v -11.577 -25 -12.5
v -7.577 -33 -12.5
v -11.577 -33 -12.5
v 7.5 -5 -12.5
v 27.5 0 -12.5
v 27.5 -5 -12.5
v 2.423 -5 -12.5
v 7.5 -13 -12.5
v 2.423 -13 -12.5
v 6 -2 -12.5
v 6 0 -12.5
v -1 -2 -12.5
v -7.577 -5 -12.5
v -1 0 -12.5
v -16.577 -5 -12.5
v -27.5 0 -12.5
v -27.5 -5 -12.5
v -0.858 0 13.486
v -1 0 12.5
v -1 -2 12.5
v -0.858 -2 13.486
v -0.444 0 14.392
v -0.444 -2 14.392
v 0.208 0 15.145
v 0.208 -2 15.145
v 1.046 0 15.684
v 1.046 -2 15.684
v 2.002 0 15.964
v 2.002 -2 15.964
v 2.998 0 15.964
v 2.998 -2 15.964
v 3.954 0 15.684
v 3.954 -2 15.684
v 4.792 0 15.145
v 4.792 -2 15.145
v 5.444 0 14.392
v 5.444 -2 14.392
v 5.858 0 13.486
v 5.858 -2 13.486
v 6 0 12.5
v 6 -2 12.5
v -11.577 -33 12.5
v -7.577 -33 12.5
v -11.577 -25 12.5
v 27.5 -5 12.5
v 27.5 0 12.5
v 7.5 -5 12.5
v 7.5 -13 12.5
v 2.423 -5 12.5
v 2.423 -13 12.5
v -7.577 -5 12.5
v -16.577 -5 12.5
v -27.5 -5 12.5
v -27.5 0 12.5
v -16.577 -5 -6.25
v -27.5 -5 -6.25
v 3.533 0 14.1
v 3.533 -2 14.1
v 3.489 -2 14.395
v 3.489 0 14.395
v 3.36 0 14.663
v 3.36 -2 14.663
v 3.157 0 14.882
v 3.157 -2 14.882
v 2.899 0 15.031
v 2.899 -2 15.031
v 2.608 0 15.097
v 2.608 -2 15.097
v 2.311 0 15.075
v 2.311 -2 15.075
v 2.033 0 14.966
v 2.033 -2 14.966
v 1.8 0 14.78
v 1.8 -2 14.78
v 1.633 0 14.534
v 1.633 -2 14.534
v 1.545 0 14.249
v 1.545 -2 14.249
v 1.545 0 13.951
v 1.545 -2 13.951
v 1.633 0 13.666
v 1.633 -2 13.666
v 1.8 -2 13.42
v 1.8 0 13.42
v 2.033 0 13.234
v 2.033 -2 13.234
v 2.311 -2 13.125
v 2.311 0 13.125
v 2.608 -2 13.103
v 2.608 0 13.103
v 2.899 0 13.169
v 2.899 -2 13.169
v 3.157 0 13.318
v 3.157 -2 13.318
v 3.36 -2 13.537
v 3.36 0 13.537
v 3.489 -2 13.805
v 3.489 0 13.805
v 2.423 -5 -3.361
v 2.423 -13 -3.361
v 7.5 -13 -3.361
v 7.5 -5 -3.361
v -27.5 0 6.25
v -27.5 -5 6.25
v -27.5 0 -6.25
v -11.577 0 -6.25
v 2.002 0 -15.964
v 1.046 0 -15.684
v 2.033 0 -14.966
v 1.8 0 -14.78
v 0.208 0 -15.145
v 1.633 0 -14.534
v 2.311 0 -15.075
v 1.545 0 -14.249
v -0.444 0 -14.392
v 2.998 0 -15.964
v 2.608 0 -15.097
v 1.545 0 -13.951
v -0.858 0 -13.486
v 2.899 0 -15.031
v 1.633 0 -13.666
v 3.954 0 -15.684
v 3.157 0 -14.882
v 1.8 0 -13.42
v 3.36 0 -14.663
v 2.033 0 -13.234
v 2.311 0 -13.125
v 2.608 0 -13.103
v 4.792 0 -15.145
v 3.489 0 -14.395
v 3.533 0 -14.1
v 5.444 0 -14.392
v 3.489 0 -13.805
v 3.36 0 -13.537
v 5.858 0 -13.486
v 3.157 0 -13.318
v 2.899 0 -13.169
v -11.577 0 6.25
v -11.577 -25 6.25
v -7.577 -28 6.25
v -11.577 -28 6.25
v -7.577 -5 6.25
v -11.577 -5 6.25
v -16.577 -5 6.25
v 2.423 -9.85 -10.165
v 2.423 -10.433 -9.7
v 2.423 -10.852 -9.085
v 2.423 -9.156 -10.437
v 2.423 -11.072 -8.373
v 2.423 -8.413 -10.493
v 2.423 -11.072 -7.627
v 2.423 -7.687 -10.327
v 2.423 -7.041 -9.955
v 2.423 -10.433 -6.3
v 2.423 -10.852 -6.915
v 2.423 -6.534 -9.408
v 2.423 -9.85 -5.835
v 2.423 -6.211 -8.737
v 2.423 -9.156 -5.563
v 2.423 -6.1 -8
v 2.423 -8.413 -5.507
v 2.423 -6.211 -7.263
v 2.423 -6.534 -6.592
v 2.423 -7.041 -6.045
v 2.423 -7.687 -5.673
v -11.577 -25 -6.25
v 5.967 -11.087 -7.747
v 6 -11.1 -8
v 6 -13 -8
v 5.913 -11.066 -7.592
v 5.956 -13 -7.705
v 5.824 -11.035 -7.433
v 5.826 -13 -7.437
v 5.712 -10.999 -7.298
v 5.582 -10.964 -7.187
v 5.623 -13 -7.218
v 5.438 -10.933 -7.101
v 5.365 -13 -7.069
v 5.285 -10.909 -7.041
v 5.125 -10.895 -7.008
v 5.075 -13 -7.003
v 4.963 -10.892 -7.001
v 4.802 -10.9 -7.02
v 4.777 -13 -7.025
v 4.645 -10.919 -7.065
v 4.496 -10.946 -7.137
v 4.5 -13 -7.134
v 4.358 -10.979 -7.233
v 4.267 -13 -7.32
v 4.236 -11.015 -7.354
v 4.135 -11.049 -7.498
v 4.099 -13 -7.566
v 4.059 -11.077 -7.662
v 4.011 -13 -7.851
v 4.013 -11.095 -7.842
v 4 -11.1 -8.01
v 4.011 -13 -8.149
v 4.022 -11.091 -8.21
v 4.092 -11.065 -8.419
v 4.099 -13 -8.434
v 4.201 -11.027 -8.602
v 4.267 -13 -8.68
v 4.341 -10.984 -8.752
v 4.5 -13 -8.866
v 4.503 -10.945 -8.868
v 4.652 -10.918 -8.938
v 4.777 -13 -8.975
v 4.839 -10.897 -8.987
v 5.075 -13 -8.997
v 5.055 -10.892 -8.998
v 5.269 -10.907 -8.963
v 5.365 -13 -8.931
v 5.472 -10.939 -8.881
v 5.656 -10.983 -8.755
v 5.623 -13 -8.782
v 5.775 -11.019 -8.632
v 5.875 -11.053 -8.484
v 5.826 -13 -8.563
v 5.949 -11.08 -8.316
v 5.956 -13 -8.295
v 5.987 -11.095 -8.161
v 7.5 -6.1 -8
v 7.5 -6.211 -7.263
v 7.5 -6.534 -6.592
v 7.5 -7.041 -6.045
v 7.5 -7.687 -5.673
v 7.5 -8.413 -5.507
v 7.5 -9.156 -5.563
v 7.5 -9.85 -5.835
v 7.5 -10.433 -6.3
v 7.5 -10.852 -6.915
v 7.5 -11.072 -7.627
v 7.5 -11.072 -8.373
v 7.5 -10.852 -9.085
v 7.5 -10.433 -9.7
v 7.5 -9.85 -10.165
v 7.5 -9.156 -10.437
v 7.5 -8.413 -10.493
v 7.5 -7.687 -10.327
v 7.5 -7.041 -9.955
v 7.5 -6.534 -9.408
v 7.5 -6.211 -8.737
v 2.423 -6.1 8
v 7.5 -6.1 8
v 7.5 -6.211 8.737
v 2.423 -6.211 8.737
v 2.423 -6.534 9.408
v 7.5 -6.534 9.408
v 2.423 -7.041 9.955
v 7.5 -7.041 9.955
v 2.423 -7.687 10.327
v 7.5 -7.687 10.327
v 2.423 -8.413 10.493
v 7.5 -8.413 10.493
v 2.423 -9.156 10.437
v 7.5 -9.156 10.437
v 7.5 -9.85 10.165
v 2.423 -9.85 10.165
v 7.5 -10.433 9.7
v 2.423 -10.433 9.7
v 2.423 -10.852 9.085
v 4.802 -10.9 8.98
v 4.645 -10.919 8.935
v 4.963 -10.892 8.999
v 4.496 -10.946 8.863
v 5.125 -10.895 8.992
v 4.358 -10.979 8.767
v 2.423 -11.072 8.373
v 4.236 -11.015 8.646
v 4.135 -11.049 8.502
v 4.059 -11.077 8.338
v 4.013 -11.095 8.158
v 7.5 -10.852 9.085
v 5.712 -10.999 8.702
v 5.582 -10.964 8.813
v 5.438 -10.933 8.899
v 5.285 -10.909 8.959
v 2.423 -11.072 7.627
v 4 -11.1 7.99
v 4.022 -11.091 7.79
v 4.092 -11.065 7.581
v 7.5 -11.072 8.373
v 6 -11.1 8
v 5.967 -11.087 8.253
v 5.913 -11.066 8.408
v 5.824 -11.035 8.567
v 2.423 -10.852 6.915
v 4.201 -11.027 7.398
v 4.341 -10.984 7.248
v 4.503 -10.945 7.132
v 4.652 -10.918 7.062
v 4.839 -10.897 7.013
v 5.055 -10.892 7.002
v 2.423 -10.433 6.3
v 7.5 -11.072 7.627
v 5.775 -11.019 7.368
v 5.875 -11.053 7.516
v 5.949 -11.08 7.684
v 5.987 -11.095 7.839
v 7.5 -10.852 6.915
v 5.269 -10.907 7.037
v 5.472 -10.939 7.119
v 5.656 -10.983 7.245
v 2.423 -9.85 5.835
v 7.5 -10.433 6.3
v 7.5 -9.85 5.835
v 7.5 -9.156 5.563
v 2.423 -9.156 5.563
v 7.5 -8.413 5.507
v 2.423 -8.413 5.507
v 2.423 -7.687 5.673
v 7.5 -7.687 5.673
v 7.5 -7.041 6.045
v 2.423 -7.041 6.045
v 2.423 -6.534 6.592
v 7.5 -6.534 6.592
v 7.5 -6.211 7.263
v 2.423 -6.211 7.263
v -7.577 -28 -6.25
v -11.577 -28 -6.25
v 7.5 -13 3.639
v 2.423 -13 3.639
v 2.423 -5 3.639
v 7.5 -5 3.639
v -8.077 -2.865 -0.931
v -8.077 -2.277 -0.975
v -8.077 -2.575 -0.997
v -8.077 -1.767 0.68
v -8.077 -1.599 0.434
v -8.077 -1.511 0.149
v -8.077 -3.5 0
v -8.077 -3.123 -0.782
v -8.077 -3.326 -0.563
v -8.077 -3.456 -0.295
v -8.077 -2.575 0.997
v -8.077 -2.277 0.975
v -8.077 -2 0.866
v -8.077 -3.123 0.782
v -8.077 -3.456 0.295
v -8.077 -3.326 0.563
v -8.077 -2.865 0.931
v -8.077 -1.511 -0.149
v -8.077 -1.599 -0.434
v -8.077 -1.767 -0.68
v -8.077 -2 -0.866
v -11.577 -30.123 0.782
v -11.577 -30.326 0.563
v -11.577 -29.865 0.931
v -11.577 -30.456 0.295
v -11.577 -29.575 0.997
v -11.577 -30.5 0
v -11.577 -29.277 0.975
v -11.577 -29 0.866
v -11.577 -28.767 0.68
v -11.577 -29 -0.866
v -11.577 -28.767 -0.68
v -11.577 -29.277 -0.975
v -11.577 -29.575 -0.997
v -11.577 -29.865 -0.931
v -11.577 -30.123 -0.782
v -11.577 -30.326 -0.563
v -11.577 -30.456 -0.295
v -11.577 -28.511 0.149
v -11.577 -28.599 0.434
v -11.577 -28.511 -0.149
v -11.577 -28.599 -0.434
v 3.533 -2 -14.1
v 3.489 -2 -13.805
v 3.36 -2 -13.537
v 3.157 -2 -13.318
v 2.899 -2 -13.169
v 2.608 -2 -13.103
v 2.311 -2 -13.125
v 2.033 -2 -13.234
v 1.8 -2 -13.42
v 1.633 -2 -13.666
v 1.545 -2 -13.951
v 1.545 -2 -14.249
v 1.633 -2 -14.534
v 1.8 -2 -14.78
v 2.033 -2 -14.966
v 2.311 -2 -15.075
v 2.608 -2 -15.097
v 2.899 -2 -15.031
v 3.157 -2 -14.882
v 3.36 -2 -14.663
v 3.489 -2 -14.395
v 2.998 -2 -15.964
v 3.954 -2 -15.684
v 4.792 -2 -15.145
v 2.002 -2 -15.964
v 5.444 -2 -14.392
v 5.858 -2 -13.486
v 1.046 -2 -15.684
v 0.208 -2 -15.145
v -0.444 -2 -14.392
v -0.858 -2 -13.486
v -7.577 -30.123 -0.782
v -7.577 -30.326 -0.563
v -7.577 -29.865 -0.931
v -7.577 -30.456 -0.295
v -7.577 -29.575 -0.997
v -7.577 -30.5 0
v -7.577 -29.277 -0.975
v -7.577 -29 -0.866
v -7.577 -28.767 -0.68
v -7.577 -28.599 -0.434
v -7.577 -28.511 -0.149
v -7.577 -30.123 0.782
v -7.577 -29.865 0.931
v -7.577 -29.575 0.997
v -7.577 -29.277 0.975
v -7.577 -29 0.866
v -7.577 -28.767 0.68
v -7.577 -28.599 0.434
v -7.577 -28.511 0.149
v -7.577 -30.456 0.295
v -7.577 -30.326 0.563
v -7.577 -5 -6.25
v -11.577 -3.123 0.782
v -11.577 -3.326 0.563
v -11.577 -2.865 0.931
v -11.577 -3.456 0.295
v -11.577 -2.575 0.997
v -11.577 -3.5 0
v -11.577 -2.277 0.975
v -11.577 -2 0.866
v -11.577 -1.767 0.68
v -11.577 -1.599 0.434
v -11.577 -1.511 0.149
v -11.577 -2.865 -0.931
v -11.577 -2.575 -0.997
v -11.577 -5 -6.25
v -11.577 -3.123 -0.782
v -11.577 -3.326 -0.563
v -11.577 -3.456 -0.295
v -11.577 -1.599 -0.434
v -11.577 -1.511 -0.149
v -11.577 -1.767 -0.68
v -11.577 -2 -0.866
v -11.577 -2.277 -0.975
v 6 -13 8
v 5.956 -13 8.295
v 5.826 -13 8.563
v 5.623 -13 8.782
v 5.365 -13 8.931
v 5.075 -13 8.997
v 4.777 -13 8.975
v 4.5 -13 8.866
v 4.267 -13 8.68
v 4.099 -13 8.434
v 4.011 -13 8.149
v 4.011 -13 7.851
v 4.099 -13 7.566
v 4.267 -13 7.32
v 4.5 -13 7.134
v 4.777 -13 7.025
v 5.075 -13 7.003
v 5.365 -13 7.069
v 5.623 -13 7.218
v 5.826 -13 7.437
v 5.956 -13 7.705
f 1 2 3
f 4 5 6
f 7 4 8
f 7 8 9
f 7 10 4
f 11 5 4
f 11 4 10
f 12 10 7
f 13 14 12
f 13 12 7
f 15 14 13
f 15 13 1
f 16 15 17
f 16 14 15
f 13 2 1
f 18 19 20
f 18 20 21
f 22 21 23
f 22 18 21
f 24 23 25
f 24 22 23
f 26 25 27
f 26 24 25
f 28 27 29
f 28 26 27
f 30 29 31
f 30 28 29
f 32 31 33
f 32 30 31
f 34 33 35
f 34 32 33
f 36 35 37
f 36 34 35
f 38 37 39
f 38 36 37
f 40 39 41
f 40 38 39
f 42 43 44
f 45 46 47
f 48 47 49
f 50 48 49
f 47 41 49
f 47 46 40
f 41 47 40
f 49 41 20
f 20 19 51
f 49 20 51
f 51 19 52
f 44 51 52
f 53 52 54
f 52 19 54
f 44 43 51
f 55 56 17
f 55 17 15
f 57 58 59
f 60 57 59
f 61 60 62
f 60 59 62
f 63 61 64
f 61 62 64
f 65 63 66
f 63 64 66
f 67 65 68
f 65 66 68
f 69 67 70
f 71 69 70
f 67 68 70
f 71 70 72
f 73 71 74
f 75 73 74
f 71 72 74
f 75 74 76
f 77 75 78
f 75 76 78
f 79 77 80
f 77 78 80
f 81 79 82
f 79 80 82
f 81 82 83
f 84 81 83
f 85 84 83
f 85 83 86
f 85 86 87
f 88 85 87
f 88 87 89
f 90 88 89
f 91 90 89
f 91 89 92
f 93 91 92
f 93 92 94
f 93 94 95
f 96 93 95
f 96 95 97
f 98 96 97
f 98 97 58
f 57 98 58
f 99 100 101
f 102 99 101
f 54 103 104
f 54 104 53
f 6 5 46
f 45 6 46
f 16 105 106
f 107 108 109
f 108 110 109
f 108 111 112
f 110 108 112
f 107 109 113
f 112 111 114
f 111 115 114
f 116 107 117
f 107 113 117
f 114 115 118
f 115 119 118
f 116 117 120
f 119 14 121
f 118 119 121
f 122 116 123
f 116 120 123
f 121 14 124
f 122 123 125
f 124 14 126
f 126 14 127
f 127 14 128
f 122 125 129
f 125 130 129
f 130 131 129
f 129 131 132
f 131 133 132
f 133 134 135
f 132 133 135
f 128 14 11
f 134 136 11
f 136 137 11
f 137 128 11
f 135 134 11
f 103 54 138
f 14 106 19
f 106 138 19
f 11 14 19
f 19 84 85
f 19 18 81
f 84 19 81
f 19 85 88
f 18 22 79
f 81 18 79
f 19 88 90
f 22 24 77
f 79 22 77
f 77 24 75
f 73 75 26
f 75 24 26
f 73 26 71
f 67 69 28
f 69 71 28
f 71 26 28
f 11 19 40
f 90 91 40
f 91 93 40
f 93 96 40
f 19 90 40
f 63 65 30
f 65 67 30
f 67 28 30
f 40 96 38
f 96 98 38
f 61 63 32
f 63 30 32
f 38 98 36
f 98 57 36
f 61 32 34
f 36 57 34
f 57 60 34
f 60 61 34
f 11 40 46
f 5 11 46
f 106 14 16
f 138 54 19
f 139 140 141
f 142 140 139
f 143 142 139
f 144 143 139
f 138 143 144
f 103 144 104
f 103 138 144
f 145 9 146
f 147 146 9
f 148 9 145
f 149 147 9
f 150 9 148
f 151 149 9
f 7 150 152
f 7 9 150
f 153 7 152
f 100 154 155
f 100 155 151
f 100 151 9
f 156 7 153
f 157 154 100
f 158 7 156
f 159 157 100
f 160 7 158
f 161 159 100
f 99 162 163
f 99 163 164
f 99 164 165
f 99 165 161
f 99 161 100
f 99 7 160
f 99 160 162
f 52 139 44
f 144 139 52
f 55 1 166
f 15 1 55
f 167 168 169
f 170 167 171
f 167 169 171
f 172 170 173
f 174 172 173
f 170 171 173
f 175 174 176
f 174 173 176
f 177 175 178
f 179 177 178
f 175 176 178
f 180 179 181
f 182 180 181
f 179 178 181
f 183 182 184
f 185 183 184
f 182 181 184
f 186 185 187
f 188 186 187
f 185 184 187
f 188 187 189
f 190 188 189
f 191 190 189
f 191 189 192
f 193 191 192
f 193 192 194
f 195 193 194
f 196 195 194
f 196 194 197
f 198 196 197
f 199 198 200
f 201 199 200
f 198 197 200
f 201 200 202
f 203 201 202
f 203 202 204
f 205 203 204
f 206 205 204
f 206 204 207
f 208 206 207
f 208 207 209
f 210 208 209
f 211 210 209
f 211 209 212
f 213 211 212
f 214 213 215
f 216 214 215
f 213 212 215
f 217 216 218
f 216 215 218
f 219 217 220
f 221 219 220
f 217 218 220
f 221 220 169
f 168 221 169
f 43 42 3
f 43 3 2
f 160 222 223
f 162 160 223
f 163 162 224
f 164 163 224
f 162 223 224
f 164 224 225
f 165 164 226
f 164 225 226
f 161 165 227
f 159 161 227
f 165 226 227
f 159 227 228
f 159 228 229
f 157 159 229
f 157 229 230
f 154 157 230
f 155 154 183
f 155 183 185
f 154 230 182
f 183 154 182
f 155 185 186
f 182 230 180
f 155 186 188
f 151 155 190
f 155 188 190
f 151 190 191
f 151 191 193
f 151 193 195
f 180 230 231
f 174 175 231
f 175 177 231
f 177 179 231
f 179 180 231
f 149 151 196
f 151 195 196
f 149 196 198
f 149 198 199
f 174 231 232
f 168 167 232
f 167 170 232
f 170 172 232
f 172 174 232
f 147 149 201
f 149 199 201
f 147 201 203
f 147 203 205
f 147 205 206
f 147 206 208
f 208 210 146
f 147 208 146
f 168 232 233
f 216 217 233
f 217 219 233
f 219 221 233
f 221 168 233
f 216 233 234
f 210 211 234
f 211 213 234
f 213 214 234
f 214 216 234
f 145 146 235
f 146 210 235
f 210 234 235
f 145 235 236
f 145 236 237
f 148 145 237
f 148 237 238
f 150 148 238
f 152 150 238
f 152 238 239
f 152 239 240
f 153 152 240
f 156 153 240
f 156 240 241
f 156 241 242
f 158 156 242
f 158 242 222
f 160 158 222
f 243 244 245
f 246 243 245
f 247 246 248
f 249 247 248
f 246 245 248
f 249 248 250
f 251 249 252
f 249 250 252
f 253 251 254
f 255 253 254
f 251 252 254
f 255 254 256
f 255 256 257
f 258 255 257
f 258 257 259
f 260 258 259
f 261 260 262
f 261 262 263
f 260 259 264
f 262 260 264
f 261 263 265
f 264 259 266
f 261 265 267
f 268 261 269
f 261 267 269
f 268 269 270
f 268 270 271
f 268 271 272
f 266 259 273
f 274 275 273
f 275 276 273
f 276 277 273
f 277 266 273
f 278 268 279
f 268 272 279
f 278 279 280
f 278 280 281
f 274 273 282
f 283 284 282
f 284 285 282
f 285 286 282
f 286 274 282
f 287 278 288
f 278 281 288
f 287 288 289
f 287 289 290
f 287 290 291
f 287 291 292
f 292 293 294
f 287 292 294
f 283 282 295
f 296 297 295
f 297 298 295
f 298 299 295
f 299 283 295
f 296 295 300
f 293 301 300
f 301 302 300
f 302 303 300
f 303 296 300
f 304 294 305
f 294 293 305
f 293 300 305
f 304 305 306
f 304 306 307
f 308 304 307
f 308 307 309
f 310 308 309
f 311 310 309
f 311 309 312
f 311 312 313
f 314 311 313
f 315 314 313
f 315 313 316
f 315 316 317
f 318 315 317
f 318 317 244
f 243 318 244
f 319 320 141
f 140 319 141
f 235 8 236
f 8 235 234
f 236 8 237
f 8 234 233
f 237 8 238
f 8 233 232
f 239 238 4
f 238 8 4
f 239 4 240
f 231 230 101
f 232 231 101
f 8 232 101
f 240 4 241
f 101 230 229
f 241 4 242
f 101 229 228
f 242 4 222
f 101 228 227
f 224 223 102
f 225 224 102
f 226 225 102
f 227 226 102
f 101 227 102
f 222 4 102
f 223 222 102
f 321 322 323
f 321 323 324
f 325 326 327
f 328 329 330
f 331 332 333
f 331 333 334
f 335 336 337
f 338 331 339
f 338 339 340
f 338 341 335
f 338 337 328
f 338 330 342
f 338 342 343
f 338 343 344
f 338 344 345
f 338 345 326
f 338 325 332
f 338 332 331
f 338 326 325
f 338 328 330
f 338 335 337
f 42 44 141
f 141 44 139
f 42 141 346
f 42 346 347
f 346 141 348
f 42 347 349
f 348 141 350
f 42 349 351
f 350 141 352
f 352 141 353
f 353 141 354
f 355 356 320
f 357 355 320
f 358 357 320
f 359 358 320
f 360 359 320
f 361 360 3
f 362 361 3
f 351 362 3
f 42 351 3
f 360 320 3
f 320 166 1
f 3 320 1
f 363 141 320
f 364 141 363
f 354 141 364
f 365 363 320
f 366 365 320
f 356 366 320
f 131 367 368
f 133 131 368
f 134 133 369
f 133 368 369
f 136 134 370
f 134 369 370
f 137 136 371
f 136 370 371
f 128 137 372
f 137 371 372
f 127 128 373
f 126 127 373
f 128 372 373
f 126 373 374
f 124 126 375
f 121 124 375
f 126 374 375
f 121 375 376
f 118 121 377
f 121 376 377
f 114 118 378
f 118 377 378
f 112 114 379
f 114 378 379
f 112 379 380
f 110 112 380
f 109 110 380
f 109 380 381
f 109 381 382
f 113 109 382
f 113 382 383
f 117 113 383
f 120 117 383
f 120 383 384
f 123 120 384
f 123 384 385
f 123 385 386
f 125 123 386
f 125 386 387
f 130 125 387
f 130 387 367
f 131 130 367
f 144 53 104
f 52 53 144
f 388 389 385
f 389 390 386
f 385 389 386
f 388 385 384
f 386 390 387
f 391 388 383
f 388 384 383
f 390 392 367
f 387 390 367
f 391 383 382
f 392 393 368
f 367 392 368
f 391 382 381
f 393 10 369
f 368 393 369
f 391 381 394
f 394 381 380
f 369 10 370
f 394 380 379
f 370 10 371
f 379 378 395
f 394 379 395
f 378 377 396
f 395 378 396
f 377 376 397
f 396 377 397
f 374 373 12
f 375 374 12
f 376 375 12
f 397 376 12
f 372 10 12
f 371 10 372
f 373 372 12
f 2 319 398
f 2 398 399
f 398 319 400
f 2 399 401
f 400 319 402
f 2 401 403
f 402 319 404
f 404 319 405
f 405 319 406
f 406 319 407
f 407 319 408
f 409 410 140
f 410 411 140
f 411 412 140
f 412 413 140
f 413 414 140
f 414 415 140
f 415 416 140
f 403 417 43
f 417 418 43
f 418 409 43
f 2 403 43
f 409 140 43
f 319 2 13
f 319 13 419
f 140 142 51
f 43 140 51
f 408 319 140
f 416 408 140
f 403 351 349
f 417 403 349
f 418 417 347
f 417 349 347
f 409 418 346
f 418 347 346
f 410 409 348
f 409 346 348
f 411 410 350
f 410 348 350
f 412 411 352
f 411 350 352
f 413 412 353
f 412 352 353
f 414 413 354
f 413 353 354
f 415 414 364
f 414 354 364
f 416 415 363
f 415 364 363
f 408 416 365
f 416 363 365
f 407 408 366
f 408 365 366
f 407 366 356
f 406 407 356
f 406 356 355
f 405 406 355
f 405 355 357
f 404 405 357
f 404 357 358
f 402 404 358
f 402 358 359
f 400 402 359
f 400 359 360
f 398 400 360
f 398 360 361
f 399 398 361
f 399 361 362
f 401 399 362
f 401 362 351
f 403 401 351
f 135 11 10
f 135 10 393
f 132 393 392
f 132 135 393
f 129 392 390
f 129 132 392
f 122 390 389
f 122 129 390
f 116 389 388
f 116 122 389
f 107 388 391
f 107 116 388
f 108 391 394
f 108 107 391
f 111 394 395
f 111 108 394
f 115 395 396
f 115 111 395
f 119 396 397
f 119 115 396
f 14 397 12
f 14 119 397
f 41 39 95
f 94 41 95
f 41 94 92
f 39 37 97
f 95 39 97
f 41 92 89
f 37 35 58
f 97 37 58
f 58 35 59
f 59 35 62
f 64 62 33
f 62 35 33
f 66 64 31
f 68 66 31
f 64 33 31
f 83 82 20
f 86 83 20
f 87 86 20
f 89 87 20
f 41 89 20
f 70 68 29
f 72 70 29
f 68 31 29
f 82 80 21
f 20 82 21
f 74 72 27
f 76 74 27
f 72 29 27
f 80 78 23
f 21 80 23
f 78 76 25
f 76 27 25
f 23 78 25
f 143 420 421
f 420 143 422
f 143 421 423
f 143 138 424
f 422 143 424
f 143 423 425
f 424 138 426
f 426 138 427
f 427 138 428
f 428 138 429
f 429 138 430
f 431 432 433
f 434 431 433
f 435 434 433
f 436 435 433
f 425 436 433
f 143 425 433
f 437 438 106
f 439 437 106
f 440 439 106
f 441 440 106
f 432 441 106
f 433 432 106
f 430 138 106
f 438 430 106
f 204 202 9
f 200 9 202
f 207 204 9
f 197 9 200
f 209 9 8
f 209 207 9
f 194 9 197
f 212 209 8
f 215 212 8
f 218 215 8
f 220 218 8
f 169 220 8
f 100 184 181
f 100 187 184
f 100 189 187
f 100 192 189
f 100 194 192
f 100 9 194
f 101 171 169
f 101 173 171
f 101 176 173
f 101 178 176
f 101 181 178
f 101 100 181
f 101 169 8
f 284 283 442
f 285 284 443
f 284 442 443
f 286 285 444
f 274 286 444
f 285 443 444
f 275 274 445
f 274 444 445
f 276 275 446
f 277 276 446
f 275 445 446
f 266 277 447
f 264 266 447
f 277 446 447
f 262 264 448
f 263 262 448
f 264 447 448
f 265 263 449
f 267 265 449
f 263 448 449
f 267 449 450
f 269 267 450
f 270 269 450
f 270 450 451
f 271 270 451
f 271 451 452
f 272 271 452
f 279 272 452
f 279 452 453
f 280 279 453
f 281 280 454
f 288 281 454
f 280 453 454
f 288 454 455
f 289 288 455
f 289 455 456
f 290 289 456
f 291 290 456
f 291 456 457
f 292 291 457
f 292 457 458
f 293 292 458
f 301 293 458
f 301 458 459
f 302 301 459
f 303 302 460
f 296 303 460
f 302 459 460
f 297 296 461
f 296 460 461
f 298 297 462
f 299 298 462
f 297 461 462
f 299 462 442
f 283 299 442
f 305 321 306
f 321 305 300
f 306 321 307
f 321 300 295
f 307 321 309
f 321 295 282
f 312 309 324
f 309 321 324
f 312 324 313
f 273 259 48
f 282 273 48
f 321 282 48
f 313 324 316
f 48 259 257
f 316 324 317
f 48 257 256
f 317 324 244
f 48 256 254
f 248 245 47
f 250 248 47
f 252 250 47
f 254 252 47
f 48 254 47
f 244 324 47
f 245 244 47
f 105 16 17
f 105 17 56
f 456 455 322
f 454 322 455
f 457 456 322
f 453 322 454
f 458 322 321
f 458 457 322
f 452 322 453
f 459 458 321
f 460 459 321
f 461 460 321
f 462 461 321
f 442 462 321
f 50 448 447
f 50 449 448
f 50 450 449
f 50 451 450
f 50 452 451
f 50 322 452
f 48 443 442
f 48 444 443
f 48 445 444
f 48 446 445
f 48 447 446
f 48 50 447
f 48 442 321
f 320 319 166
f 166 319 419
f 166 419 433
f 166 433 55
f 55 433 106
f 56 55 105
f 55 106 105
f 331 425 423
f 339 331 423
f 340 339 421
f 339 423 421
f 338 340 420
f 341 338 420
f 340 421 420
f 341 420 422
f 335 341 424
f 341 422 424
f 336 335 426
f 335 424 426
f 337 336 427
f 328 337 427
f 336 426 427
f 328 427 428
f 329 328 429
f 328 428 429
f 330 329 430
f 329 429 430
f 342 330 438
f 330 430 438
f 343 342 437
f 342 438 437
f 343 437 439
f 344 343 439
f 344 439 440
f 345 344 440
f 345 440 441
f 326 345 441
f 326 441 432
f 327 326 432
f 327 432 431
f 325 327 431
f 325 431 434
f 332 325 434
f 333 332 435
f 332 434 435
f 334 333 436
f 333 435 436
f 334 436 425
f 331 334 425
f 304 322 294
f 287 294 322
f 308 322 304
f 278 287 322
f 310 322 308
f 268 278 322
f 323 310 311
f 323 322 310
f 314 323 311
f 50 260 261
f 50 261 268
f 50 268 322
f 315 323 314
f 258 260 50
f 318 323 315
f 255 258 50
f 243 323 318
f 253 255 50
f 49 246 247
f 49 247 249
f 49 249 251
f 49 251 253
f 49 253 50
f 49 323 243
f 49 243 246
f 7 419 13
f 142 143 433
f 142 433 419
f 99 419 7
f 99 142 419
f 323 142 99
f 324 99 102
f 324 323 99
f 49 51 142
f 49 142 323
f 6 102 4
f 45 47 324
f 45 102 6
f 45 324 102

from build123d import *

# Parameters (mm, degrees)
F0_W          = 55
F0_H          = 25
F1_DEPTH      = 5
F2_W          = 15.9233940393
F2_H          = 12.5
F3_DEPTH      = 5.001
F4_R          = 1
F5_DEPTH      = 3.5
F7_DEPTH      = 28
F8_W          = 23
F8_H          = 12.5
F9_DEPTH      = 39.0776059607
F10_R         = 1
F11_DEPTH     = 39.0776059607
F12_W         = 5.0766059607
F12_H         = 8.8610539977
F12_H_2       = 9.1389460023
F13_DEPTH     = 8
F14_R         = 2.5
F15_DEPTH     = 10
F16_T1_DEPTH  = 6.25
F16_T3_DEPTH  = 6.25
F16_T8_DEPTH  = 58.1925499954
F16_T14_DEPTH = 58.1925499954
F17_R         = 1
F18_DEPTH     = 3
F20_DEPTH     = 2
F21_R         = 1
F22_DEPTH     = 2.001


# Not quite as in the source:
# - a fillet or chamfer that OpenCascade refuses, or shapes differently, is made with other operations: its cross-section is extruded or revolved along the edge and cut away or added


with BuildPart() as f1:
    # F0 (on Front) → F1 (new body)
    with BuildSketch(Plane.XZ):
        Rectangle(F0_W, F0_H)
    extrude(amount=F1_DEPTH)

    # F2 (on face) → F3 (cut, through all)
    with BuildSketch(Plane.XZ.offset(5)):
        with Locations((-19.5383029804, 0)):
            Rectangle(F2_W, F2_H)
    extrude(amount=-F3_DEPTH, mode=Mode.SUBTRACT)

    # F4 (on face) → F5 (cut)
    with BuildSketch(Plane(origin=(-11.5766059607, 0, 0), x_dir=(0, -1, 0), z_dir=(-1, 0, 0))):
        with Locations((2.5, 0)):
            Circle(F4_R)
    extrude(amount=-F5_DEPTH, mode=Mode.SUBTRACT)

    # F6 (on face) → F7 (join)
    with BuildSketch(Plane.XZ.offset(5)):
        Polygon((-7.5766059607, 12.5), (-11.5766059607, 12.5), (-11.5766059607, 6.25), (-11.5766059607, -6.25), (-11.5766059607, -12.5), (-7.5766059607, -12.5), align=None)
    extrude(amount=F7_DEPTH)

    # F8 (on face) → F9 (cut, through all)
    with BuildSketch(Plane(origin=(-11.5766059607, 0, 0), x_dir=(0, -1, 0), z_dir=(-1, 0, 0))):
        with Locations((16.5, 0)):
            Rectangle(F8_W, F8_H)
    extrude(amount=-F9_DEPTH, mode=Mode.SUBTRACT)

    # F10 (on face) → F11 (cut, through all)
    with BuildSketch(Plane(origin=(-11.5766059607, 0, 0), x_dir=(0, -1, 0), z_dir=(-1, 0, 0))):
        with Locations((29.5, 0)):
            Circle(F10_R)
    extrude(amount=-F11_DEPTH, mode=Mode.SUBTRACT)

    # F12 (on face) → F13 (join)
    with BuildSketch(Plane.XZ.offset(5)):
        with Locations((4.9616970196, 8.0694730012)):
            Rectangle(F12_W, F12_H)
        with Locations((4.9616970196, -7.9305269988)):
            Rectangle(F12_W, F12_H_2)
    extrude(amount=F13_DEPTH)

    # F14 (on face) → F15 (cut)
    with BuildSketch(Plane.YZ.offset(7.5)):
        with Locations((-8.6, 8)):
            Circle(F14_R)
        with Locations((-8.6, -8)):
            Circle(F14_R)
    extrude(amount=-F15_DEPTH, mode=Mode.SUBTRACT)

    # F16: chamfer of 20 x 5 on 2 edges, made by hand

    # F16_s2 → F16_t1 (join)
    with BuildSketch(Plane.XY.offset(6.25)):
        Polygon((-11.5766059607, -25), (-16.5766059607, -5), (-11.5766059607, -5), align=None)
    extrude(amount=F16_T1_DEPTH)

    # F16_s4 → F16_t3 (join)
    with BuildSketch(Plane.XY.offset(-12.5)):
        Polygon((-11.5766059607, -25), (-16.5766059607, -5), (-11.5766059607, -5), align=None)
    extrude(amount=F16_T3_DEPTH)


with BuildPart() as f16_tool6:
    # F16_s7 → F16_t8 (new body)
    with BuildSketch(Plane.XY.offset(12.5)):
        Polygon((-11.5766059607, -25), (-16.5766059607, -5), (-11.5766059607, -5), align=None)
    extrude(amount=-F16_T8_DEPTH)

    split(bisect_by=Plane.XY.offset(-6.25), keep=Keep.BOTTOM)

    split(bisect_by=Plane.XY.offset(-12.5), keep=Keep.TOP)


with BuildPart() as f1_1:
    add(f1.part)

    # F16_t5: union F16_tool6
    add(f16_tool6.part)


with BuildPart() as f16_tool12:
    # F16_s13 → F16_t14 (new body)
    with BuildSketch(Plane.XY.offset(45.6925499954)):
        Polygon((-11.5766059607, -25), (-16.5766059607, -5), (-11.5766059607, -5), align=None)
    extrude(amount=-F16_T14_DEPTH)

    split(bisect_by=Plane.XY.offset(12.5), keep=Keep.BOTTOM)

    split(bisect_by=Plane.XY.offset(6.25), keep=Keep.TOP)


with BuildPart() as f1_2:
    add(f1_1.part)

    # F16_t11: union F16_tool12
    add(f16_tool12.part)

    # F17 (on face) → F18 (cut)
    with BuildSketch(Plane.XZ.offset(13)):
        with Locations((5, 8)):
            Circle(F17_R)
        with Locations((5, -8)):
            Circle(F17_R)
    extrude(amount=-F18_DEPTH, mode=Mode.SUBTRACT)

    # F19 (on face) → F20 (join)
    with BuildSketch(Plane(origin=(0, 0, 0), x_dir=(-1, 0, 0), z_dir=(0, 1, 0))):
        with BuildLine():
            Line((1, -12.5), (-6, -12.5))
            ThreePointArc((-6, -12.5), (-2.5, -16), (1, -12.5))
        make_face()
        with BuildLine():
            Line((-6, 12.5), (1, 12.5))
            ThreePointArc((1, 12.5), (-2.5, 16), (-6, 12.5))
        make_face()
    extrude(amount=-F20_DEPTH)

    # F21 (on face) → F22 (cut, through all)
    with BuildSketch(Plane.XZ.offset(2)):
        with Locations((2.5334937964, 14.1)):
            Circle(F21_R)
        with Locations((2.5334937964, -14.1)):
            Circle(F21_R)
    extrude(amount=-F22_DEPTH, mode=Mode.SUBTRACT)


solid = f1_2.part
